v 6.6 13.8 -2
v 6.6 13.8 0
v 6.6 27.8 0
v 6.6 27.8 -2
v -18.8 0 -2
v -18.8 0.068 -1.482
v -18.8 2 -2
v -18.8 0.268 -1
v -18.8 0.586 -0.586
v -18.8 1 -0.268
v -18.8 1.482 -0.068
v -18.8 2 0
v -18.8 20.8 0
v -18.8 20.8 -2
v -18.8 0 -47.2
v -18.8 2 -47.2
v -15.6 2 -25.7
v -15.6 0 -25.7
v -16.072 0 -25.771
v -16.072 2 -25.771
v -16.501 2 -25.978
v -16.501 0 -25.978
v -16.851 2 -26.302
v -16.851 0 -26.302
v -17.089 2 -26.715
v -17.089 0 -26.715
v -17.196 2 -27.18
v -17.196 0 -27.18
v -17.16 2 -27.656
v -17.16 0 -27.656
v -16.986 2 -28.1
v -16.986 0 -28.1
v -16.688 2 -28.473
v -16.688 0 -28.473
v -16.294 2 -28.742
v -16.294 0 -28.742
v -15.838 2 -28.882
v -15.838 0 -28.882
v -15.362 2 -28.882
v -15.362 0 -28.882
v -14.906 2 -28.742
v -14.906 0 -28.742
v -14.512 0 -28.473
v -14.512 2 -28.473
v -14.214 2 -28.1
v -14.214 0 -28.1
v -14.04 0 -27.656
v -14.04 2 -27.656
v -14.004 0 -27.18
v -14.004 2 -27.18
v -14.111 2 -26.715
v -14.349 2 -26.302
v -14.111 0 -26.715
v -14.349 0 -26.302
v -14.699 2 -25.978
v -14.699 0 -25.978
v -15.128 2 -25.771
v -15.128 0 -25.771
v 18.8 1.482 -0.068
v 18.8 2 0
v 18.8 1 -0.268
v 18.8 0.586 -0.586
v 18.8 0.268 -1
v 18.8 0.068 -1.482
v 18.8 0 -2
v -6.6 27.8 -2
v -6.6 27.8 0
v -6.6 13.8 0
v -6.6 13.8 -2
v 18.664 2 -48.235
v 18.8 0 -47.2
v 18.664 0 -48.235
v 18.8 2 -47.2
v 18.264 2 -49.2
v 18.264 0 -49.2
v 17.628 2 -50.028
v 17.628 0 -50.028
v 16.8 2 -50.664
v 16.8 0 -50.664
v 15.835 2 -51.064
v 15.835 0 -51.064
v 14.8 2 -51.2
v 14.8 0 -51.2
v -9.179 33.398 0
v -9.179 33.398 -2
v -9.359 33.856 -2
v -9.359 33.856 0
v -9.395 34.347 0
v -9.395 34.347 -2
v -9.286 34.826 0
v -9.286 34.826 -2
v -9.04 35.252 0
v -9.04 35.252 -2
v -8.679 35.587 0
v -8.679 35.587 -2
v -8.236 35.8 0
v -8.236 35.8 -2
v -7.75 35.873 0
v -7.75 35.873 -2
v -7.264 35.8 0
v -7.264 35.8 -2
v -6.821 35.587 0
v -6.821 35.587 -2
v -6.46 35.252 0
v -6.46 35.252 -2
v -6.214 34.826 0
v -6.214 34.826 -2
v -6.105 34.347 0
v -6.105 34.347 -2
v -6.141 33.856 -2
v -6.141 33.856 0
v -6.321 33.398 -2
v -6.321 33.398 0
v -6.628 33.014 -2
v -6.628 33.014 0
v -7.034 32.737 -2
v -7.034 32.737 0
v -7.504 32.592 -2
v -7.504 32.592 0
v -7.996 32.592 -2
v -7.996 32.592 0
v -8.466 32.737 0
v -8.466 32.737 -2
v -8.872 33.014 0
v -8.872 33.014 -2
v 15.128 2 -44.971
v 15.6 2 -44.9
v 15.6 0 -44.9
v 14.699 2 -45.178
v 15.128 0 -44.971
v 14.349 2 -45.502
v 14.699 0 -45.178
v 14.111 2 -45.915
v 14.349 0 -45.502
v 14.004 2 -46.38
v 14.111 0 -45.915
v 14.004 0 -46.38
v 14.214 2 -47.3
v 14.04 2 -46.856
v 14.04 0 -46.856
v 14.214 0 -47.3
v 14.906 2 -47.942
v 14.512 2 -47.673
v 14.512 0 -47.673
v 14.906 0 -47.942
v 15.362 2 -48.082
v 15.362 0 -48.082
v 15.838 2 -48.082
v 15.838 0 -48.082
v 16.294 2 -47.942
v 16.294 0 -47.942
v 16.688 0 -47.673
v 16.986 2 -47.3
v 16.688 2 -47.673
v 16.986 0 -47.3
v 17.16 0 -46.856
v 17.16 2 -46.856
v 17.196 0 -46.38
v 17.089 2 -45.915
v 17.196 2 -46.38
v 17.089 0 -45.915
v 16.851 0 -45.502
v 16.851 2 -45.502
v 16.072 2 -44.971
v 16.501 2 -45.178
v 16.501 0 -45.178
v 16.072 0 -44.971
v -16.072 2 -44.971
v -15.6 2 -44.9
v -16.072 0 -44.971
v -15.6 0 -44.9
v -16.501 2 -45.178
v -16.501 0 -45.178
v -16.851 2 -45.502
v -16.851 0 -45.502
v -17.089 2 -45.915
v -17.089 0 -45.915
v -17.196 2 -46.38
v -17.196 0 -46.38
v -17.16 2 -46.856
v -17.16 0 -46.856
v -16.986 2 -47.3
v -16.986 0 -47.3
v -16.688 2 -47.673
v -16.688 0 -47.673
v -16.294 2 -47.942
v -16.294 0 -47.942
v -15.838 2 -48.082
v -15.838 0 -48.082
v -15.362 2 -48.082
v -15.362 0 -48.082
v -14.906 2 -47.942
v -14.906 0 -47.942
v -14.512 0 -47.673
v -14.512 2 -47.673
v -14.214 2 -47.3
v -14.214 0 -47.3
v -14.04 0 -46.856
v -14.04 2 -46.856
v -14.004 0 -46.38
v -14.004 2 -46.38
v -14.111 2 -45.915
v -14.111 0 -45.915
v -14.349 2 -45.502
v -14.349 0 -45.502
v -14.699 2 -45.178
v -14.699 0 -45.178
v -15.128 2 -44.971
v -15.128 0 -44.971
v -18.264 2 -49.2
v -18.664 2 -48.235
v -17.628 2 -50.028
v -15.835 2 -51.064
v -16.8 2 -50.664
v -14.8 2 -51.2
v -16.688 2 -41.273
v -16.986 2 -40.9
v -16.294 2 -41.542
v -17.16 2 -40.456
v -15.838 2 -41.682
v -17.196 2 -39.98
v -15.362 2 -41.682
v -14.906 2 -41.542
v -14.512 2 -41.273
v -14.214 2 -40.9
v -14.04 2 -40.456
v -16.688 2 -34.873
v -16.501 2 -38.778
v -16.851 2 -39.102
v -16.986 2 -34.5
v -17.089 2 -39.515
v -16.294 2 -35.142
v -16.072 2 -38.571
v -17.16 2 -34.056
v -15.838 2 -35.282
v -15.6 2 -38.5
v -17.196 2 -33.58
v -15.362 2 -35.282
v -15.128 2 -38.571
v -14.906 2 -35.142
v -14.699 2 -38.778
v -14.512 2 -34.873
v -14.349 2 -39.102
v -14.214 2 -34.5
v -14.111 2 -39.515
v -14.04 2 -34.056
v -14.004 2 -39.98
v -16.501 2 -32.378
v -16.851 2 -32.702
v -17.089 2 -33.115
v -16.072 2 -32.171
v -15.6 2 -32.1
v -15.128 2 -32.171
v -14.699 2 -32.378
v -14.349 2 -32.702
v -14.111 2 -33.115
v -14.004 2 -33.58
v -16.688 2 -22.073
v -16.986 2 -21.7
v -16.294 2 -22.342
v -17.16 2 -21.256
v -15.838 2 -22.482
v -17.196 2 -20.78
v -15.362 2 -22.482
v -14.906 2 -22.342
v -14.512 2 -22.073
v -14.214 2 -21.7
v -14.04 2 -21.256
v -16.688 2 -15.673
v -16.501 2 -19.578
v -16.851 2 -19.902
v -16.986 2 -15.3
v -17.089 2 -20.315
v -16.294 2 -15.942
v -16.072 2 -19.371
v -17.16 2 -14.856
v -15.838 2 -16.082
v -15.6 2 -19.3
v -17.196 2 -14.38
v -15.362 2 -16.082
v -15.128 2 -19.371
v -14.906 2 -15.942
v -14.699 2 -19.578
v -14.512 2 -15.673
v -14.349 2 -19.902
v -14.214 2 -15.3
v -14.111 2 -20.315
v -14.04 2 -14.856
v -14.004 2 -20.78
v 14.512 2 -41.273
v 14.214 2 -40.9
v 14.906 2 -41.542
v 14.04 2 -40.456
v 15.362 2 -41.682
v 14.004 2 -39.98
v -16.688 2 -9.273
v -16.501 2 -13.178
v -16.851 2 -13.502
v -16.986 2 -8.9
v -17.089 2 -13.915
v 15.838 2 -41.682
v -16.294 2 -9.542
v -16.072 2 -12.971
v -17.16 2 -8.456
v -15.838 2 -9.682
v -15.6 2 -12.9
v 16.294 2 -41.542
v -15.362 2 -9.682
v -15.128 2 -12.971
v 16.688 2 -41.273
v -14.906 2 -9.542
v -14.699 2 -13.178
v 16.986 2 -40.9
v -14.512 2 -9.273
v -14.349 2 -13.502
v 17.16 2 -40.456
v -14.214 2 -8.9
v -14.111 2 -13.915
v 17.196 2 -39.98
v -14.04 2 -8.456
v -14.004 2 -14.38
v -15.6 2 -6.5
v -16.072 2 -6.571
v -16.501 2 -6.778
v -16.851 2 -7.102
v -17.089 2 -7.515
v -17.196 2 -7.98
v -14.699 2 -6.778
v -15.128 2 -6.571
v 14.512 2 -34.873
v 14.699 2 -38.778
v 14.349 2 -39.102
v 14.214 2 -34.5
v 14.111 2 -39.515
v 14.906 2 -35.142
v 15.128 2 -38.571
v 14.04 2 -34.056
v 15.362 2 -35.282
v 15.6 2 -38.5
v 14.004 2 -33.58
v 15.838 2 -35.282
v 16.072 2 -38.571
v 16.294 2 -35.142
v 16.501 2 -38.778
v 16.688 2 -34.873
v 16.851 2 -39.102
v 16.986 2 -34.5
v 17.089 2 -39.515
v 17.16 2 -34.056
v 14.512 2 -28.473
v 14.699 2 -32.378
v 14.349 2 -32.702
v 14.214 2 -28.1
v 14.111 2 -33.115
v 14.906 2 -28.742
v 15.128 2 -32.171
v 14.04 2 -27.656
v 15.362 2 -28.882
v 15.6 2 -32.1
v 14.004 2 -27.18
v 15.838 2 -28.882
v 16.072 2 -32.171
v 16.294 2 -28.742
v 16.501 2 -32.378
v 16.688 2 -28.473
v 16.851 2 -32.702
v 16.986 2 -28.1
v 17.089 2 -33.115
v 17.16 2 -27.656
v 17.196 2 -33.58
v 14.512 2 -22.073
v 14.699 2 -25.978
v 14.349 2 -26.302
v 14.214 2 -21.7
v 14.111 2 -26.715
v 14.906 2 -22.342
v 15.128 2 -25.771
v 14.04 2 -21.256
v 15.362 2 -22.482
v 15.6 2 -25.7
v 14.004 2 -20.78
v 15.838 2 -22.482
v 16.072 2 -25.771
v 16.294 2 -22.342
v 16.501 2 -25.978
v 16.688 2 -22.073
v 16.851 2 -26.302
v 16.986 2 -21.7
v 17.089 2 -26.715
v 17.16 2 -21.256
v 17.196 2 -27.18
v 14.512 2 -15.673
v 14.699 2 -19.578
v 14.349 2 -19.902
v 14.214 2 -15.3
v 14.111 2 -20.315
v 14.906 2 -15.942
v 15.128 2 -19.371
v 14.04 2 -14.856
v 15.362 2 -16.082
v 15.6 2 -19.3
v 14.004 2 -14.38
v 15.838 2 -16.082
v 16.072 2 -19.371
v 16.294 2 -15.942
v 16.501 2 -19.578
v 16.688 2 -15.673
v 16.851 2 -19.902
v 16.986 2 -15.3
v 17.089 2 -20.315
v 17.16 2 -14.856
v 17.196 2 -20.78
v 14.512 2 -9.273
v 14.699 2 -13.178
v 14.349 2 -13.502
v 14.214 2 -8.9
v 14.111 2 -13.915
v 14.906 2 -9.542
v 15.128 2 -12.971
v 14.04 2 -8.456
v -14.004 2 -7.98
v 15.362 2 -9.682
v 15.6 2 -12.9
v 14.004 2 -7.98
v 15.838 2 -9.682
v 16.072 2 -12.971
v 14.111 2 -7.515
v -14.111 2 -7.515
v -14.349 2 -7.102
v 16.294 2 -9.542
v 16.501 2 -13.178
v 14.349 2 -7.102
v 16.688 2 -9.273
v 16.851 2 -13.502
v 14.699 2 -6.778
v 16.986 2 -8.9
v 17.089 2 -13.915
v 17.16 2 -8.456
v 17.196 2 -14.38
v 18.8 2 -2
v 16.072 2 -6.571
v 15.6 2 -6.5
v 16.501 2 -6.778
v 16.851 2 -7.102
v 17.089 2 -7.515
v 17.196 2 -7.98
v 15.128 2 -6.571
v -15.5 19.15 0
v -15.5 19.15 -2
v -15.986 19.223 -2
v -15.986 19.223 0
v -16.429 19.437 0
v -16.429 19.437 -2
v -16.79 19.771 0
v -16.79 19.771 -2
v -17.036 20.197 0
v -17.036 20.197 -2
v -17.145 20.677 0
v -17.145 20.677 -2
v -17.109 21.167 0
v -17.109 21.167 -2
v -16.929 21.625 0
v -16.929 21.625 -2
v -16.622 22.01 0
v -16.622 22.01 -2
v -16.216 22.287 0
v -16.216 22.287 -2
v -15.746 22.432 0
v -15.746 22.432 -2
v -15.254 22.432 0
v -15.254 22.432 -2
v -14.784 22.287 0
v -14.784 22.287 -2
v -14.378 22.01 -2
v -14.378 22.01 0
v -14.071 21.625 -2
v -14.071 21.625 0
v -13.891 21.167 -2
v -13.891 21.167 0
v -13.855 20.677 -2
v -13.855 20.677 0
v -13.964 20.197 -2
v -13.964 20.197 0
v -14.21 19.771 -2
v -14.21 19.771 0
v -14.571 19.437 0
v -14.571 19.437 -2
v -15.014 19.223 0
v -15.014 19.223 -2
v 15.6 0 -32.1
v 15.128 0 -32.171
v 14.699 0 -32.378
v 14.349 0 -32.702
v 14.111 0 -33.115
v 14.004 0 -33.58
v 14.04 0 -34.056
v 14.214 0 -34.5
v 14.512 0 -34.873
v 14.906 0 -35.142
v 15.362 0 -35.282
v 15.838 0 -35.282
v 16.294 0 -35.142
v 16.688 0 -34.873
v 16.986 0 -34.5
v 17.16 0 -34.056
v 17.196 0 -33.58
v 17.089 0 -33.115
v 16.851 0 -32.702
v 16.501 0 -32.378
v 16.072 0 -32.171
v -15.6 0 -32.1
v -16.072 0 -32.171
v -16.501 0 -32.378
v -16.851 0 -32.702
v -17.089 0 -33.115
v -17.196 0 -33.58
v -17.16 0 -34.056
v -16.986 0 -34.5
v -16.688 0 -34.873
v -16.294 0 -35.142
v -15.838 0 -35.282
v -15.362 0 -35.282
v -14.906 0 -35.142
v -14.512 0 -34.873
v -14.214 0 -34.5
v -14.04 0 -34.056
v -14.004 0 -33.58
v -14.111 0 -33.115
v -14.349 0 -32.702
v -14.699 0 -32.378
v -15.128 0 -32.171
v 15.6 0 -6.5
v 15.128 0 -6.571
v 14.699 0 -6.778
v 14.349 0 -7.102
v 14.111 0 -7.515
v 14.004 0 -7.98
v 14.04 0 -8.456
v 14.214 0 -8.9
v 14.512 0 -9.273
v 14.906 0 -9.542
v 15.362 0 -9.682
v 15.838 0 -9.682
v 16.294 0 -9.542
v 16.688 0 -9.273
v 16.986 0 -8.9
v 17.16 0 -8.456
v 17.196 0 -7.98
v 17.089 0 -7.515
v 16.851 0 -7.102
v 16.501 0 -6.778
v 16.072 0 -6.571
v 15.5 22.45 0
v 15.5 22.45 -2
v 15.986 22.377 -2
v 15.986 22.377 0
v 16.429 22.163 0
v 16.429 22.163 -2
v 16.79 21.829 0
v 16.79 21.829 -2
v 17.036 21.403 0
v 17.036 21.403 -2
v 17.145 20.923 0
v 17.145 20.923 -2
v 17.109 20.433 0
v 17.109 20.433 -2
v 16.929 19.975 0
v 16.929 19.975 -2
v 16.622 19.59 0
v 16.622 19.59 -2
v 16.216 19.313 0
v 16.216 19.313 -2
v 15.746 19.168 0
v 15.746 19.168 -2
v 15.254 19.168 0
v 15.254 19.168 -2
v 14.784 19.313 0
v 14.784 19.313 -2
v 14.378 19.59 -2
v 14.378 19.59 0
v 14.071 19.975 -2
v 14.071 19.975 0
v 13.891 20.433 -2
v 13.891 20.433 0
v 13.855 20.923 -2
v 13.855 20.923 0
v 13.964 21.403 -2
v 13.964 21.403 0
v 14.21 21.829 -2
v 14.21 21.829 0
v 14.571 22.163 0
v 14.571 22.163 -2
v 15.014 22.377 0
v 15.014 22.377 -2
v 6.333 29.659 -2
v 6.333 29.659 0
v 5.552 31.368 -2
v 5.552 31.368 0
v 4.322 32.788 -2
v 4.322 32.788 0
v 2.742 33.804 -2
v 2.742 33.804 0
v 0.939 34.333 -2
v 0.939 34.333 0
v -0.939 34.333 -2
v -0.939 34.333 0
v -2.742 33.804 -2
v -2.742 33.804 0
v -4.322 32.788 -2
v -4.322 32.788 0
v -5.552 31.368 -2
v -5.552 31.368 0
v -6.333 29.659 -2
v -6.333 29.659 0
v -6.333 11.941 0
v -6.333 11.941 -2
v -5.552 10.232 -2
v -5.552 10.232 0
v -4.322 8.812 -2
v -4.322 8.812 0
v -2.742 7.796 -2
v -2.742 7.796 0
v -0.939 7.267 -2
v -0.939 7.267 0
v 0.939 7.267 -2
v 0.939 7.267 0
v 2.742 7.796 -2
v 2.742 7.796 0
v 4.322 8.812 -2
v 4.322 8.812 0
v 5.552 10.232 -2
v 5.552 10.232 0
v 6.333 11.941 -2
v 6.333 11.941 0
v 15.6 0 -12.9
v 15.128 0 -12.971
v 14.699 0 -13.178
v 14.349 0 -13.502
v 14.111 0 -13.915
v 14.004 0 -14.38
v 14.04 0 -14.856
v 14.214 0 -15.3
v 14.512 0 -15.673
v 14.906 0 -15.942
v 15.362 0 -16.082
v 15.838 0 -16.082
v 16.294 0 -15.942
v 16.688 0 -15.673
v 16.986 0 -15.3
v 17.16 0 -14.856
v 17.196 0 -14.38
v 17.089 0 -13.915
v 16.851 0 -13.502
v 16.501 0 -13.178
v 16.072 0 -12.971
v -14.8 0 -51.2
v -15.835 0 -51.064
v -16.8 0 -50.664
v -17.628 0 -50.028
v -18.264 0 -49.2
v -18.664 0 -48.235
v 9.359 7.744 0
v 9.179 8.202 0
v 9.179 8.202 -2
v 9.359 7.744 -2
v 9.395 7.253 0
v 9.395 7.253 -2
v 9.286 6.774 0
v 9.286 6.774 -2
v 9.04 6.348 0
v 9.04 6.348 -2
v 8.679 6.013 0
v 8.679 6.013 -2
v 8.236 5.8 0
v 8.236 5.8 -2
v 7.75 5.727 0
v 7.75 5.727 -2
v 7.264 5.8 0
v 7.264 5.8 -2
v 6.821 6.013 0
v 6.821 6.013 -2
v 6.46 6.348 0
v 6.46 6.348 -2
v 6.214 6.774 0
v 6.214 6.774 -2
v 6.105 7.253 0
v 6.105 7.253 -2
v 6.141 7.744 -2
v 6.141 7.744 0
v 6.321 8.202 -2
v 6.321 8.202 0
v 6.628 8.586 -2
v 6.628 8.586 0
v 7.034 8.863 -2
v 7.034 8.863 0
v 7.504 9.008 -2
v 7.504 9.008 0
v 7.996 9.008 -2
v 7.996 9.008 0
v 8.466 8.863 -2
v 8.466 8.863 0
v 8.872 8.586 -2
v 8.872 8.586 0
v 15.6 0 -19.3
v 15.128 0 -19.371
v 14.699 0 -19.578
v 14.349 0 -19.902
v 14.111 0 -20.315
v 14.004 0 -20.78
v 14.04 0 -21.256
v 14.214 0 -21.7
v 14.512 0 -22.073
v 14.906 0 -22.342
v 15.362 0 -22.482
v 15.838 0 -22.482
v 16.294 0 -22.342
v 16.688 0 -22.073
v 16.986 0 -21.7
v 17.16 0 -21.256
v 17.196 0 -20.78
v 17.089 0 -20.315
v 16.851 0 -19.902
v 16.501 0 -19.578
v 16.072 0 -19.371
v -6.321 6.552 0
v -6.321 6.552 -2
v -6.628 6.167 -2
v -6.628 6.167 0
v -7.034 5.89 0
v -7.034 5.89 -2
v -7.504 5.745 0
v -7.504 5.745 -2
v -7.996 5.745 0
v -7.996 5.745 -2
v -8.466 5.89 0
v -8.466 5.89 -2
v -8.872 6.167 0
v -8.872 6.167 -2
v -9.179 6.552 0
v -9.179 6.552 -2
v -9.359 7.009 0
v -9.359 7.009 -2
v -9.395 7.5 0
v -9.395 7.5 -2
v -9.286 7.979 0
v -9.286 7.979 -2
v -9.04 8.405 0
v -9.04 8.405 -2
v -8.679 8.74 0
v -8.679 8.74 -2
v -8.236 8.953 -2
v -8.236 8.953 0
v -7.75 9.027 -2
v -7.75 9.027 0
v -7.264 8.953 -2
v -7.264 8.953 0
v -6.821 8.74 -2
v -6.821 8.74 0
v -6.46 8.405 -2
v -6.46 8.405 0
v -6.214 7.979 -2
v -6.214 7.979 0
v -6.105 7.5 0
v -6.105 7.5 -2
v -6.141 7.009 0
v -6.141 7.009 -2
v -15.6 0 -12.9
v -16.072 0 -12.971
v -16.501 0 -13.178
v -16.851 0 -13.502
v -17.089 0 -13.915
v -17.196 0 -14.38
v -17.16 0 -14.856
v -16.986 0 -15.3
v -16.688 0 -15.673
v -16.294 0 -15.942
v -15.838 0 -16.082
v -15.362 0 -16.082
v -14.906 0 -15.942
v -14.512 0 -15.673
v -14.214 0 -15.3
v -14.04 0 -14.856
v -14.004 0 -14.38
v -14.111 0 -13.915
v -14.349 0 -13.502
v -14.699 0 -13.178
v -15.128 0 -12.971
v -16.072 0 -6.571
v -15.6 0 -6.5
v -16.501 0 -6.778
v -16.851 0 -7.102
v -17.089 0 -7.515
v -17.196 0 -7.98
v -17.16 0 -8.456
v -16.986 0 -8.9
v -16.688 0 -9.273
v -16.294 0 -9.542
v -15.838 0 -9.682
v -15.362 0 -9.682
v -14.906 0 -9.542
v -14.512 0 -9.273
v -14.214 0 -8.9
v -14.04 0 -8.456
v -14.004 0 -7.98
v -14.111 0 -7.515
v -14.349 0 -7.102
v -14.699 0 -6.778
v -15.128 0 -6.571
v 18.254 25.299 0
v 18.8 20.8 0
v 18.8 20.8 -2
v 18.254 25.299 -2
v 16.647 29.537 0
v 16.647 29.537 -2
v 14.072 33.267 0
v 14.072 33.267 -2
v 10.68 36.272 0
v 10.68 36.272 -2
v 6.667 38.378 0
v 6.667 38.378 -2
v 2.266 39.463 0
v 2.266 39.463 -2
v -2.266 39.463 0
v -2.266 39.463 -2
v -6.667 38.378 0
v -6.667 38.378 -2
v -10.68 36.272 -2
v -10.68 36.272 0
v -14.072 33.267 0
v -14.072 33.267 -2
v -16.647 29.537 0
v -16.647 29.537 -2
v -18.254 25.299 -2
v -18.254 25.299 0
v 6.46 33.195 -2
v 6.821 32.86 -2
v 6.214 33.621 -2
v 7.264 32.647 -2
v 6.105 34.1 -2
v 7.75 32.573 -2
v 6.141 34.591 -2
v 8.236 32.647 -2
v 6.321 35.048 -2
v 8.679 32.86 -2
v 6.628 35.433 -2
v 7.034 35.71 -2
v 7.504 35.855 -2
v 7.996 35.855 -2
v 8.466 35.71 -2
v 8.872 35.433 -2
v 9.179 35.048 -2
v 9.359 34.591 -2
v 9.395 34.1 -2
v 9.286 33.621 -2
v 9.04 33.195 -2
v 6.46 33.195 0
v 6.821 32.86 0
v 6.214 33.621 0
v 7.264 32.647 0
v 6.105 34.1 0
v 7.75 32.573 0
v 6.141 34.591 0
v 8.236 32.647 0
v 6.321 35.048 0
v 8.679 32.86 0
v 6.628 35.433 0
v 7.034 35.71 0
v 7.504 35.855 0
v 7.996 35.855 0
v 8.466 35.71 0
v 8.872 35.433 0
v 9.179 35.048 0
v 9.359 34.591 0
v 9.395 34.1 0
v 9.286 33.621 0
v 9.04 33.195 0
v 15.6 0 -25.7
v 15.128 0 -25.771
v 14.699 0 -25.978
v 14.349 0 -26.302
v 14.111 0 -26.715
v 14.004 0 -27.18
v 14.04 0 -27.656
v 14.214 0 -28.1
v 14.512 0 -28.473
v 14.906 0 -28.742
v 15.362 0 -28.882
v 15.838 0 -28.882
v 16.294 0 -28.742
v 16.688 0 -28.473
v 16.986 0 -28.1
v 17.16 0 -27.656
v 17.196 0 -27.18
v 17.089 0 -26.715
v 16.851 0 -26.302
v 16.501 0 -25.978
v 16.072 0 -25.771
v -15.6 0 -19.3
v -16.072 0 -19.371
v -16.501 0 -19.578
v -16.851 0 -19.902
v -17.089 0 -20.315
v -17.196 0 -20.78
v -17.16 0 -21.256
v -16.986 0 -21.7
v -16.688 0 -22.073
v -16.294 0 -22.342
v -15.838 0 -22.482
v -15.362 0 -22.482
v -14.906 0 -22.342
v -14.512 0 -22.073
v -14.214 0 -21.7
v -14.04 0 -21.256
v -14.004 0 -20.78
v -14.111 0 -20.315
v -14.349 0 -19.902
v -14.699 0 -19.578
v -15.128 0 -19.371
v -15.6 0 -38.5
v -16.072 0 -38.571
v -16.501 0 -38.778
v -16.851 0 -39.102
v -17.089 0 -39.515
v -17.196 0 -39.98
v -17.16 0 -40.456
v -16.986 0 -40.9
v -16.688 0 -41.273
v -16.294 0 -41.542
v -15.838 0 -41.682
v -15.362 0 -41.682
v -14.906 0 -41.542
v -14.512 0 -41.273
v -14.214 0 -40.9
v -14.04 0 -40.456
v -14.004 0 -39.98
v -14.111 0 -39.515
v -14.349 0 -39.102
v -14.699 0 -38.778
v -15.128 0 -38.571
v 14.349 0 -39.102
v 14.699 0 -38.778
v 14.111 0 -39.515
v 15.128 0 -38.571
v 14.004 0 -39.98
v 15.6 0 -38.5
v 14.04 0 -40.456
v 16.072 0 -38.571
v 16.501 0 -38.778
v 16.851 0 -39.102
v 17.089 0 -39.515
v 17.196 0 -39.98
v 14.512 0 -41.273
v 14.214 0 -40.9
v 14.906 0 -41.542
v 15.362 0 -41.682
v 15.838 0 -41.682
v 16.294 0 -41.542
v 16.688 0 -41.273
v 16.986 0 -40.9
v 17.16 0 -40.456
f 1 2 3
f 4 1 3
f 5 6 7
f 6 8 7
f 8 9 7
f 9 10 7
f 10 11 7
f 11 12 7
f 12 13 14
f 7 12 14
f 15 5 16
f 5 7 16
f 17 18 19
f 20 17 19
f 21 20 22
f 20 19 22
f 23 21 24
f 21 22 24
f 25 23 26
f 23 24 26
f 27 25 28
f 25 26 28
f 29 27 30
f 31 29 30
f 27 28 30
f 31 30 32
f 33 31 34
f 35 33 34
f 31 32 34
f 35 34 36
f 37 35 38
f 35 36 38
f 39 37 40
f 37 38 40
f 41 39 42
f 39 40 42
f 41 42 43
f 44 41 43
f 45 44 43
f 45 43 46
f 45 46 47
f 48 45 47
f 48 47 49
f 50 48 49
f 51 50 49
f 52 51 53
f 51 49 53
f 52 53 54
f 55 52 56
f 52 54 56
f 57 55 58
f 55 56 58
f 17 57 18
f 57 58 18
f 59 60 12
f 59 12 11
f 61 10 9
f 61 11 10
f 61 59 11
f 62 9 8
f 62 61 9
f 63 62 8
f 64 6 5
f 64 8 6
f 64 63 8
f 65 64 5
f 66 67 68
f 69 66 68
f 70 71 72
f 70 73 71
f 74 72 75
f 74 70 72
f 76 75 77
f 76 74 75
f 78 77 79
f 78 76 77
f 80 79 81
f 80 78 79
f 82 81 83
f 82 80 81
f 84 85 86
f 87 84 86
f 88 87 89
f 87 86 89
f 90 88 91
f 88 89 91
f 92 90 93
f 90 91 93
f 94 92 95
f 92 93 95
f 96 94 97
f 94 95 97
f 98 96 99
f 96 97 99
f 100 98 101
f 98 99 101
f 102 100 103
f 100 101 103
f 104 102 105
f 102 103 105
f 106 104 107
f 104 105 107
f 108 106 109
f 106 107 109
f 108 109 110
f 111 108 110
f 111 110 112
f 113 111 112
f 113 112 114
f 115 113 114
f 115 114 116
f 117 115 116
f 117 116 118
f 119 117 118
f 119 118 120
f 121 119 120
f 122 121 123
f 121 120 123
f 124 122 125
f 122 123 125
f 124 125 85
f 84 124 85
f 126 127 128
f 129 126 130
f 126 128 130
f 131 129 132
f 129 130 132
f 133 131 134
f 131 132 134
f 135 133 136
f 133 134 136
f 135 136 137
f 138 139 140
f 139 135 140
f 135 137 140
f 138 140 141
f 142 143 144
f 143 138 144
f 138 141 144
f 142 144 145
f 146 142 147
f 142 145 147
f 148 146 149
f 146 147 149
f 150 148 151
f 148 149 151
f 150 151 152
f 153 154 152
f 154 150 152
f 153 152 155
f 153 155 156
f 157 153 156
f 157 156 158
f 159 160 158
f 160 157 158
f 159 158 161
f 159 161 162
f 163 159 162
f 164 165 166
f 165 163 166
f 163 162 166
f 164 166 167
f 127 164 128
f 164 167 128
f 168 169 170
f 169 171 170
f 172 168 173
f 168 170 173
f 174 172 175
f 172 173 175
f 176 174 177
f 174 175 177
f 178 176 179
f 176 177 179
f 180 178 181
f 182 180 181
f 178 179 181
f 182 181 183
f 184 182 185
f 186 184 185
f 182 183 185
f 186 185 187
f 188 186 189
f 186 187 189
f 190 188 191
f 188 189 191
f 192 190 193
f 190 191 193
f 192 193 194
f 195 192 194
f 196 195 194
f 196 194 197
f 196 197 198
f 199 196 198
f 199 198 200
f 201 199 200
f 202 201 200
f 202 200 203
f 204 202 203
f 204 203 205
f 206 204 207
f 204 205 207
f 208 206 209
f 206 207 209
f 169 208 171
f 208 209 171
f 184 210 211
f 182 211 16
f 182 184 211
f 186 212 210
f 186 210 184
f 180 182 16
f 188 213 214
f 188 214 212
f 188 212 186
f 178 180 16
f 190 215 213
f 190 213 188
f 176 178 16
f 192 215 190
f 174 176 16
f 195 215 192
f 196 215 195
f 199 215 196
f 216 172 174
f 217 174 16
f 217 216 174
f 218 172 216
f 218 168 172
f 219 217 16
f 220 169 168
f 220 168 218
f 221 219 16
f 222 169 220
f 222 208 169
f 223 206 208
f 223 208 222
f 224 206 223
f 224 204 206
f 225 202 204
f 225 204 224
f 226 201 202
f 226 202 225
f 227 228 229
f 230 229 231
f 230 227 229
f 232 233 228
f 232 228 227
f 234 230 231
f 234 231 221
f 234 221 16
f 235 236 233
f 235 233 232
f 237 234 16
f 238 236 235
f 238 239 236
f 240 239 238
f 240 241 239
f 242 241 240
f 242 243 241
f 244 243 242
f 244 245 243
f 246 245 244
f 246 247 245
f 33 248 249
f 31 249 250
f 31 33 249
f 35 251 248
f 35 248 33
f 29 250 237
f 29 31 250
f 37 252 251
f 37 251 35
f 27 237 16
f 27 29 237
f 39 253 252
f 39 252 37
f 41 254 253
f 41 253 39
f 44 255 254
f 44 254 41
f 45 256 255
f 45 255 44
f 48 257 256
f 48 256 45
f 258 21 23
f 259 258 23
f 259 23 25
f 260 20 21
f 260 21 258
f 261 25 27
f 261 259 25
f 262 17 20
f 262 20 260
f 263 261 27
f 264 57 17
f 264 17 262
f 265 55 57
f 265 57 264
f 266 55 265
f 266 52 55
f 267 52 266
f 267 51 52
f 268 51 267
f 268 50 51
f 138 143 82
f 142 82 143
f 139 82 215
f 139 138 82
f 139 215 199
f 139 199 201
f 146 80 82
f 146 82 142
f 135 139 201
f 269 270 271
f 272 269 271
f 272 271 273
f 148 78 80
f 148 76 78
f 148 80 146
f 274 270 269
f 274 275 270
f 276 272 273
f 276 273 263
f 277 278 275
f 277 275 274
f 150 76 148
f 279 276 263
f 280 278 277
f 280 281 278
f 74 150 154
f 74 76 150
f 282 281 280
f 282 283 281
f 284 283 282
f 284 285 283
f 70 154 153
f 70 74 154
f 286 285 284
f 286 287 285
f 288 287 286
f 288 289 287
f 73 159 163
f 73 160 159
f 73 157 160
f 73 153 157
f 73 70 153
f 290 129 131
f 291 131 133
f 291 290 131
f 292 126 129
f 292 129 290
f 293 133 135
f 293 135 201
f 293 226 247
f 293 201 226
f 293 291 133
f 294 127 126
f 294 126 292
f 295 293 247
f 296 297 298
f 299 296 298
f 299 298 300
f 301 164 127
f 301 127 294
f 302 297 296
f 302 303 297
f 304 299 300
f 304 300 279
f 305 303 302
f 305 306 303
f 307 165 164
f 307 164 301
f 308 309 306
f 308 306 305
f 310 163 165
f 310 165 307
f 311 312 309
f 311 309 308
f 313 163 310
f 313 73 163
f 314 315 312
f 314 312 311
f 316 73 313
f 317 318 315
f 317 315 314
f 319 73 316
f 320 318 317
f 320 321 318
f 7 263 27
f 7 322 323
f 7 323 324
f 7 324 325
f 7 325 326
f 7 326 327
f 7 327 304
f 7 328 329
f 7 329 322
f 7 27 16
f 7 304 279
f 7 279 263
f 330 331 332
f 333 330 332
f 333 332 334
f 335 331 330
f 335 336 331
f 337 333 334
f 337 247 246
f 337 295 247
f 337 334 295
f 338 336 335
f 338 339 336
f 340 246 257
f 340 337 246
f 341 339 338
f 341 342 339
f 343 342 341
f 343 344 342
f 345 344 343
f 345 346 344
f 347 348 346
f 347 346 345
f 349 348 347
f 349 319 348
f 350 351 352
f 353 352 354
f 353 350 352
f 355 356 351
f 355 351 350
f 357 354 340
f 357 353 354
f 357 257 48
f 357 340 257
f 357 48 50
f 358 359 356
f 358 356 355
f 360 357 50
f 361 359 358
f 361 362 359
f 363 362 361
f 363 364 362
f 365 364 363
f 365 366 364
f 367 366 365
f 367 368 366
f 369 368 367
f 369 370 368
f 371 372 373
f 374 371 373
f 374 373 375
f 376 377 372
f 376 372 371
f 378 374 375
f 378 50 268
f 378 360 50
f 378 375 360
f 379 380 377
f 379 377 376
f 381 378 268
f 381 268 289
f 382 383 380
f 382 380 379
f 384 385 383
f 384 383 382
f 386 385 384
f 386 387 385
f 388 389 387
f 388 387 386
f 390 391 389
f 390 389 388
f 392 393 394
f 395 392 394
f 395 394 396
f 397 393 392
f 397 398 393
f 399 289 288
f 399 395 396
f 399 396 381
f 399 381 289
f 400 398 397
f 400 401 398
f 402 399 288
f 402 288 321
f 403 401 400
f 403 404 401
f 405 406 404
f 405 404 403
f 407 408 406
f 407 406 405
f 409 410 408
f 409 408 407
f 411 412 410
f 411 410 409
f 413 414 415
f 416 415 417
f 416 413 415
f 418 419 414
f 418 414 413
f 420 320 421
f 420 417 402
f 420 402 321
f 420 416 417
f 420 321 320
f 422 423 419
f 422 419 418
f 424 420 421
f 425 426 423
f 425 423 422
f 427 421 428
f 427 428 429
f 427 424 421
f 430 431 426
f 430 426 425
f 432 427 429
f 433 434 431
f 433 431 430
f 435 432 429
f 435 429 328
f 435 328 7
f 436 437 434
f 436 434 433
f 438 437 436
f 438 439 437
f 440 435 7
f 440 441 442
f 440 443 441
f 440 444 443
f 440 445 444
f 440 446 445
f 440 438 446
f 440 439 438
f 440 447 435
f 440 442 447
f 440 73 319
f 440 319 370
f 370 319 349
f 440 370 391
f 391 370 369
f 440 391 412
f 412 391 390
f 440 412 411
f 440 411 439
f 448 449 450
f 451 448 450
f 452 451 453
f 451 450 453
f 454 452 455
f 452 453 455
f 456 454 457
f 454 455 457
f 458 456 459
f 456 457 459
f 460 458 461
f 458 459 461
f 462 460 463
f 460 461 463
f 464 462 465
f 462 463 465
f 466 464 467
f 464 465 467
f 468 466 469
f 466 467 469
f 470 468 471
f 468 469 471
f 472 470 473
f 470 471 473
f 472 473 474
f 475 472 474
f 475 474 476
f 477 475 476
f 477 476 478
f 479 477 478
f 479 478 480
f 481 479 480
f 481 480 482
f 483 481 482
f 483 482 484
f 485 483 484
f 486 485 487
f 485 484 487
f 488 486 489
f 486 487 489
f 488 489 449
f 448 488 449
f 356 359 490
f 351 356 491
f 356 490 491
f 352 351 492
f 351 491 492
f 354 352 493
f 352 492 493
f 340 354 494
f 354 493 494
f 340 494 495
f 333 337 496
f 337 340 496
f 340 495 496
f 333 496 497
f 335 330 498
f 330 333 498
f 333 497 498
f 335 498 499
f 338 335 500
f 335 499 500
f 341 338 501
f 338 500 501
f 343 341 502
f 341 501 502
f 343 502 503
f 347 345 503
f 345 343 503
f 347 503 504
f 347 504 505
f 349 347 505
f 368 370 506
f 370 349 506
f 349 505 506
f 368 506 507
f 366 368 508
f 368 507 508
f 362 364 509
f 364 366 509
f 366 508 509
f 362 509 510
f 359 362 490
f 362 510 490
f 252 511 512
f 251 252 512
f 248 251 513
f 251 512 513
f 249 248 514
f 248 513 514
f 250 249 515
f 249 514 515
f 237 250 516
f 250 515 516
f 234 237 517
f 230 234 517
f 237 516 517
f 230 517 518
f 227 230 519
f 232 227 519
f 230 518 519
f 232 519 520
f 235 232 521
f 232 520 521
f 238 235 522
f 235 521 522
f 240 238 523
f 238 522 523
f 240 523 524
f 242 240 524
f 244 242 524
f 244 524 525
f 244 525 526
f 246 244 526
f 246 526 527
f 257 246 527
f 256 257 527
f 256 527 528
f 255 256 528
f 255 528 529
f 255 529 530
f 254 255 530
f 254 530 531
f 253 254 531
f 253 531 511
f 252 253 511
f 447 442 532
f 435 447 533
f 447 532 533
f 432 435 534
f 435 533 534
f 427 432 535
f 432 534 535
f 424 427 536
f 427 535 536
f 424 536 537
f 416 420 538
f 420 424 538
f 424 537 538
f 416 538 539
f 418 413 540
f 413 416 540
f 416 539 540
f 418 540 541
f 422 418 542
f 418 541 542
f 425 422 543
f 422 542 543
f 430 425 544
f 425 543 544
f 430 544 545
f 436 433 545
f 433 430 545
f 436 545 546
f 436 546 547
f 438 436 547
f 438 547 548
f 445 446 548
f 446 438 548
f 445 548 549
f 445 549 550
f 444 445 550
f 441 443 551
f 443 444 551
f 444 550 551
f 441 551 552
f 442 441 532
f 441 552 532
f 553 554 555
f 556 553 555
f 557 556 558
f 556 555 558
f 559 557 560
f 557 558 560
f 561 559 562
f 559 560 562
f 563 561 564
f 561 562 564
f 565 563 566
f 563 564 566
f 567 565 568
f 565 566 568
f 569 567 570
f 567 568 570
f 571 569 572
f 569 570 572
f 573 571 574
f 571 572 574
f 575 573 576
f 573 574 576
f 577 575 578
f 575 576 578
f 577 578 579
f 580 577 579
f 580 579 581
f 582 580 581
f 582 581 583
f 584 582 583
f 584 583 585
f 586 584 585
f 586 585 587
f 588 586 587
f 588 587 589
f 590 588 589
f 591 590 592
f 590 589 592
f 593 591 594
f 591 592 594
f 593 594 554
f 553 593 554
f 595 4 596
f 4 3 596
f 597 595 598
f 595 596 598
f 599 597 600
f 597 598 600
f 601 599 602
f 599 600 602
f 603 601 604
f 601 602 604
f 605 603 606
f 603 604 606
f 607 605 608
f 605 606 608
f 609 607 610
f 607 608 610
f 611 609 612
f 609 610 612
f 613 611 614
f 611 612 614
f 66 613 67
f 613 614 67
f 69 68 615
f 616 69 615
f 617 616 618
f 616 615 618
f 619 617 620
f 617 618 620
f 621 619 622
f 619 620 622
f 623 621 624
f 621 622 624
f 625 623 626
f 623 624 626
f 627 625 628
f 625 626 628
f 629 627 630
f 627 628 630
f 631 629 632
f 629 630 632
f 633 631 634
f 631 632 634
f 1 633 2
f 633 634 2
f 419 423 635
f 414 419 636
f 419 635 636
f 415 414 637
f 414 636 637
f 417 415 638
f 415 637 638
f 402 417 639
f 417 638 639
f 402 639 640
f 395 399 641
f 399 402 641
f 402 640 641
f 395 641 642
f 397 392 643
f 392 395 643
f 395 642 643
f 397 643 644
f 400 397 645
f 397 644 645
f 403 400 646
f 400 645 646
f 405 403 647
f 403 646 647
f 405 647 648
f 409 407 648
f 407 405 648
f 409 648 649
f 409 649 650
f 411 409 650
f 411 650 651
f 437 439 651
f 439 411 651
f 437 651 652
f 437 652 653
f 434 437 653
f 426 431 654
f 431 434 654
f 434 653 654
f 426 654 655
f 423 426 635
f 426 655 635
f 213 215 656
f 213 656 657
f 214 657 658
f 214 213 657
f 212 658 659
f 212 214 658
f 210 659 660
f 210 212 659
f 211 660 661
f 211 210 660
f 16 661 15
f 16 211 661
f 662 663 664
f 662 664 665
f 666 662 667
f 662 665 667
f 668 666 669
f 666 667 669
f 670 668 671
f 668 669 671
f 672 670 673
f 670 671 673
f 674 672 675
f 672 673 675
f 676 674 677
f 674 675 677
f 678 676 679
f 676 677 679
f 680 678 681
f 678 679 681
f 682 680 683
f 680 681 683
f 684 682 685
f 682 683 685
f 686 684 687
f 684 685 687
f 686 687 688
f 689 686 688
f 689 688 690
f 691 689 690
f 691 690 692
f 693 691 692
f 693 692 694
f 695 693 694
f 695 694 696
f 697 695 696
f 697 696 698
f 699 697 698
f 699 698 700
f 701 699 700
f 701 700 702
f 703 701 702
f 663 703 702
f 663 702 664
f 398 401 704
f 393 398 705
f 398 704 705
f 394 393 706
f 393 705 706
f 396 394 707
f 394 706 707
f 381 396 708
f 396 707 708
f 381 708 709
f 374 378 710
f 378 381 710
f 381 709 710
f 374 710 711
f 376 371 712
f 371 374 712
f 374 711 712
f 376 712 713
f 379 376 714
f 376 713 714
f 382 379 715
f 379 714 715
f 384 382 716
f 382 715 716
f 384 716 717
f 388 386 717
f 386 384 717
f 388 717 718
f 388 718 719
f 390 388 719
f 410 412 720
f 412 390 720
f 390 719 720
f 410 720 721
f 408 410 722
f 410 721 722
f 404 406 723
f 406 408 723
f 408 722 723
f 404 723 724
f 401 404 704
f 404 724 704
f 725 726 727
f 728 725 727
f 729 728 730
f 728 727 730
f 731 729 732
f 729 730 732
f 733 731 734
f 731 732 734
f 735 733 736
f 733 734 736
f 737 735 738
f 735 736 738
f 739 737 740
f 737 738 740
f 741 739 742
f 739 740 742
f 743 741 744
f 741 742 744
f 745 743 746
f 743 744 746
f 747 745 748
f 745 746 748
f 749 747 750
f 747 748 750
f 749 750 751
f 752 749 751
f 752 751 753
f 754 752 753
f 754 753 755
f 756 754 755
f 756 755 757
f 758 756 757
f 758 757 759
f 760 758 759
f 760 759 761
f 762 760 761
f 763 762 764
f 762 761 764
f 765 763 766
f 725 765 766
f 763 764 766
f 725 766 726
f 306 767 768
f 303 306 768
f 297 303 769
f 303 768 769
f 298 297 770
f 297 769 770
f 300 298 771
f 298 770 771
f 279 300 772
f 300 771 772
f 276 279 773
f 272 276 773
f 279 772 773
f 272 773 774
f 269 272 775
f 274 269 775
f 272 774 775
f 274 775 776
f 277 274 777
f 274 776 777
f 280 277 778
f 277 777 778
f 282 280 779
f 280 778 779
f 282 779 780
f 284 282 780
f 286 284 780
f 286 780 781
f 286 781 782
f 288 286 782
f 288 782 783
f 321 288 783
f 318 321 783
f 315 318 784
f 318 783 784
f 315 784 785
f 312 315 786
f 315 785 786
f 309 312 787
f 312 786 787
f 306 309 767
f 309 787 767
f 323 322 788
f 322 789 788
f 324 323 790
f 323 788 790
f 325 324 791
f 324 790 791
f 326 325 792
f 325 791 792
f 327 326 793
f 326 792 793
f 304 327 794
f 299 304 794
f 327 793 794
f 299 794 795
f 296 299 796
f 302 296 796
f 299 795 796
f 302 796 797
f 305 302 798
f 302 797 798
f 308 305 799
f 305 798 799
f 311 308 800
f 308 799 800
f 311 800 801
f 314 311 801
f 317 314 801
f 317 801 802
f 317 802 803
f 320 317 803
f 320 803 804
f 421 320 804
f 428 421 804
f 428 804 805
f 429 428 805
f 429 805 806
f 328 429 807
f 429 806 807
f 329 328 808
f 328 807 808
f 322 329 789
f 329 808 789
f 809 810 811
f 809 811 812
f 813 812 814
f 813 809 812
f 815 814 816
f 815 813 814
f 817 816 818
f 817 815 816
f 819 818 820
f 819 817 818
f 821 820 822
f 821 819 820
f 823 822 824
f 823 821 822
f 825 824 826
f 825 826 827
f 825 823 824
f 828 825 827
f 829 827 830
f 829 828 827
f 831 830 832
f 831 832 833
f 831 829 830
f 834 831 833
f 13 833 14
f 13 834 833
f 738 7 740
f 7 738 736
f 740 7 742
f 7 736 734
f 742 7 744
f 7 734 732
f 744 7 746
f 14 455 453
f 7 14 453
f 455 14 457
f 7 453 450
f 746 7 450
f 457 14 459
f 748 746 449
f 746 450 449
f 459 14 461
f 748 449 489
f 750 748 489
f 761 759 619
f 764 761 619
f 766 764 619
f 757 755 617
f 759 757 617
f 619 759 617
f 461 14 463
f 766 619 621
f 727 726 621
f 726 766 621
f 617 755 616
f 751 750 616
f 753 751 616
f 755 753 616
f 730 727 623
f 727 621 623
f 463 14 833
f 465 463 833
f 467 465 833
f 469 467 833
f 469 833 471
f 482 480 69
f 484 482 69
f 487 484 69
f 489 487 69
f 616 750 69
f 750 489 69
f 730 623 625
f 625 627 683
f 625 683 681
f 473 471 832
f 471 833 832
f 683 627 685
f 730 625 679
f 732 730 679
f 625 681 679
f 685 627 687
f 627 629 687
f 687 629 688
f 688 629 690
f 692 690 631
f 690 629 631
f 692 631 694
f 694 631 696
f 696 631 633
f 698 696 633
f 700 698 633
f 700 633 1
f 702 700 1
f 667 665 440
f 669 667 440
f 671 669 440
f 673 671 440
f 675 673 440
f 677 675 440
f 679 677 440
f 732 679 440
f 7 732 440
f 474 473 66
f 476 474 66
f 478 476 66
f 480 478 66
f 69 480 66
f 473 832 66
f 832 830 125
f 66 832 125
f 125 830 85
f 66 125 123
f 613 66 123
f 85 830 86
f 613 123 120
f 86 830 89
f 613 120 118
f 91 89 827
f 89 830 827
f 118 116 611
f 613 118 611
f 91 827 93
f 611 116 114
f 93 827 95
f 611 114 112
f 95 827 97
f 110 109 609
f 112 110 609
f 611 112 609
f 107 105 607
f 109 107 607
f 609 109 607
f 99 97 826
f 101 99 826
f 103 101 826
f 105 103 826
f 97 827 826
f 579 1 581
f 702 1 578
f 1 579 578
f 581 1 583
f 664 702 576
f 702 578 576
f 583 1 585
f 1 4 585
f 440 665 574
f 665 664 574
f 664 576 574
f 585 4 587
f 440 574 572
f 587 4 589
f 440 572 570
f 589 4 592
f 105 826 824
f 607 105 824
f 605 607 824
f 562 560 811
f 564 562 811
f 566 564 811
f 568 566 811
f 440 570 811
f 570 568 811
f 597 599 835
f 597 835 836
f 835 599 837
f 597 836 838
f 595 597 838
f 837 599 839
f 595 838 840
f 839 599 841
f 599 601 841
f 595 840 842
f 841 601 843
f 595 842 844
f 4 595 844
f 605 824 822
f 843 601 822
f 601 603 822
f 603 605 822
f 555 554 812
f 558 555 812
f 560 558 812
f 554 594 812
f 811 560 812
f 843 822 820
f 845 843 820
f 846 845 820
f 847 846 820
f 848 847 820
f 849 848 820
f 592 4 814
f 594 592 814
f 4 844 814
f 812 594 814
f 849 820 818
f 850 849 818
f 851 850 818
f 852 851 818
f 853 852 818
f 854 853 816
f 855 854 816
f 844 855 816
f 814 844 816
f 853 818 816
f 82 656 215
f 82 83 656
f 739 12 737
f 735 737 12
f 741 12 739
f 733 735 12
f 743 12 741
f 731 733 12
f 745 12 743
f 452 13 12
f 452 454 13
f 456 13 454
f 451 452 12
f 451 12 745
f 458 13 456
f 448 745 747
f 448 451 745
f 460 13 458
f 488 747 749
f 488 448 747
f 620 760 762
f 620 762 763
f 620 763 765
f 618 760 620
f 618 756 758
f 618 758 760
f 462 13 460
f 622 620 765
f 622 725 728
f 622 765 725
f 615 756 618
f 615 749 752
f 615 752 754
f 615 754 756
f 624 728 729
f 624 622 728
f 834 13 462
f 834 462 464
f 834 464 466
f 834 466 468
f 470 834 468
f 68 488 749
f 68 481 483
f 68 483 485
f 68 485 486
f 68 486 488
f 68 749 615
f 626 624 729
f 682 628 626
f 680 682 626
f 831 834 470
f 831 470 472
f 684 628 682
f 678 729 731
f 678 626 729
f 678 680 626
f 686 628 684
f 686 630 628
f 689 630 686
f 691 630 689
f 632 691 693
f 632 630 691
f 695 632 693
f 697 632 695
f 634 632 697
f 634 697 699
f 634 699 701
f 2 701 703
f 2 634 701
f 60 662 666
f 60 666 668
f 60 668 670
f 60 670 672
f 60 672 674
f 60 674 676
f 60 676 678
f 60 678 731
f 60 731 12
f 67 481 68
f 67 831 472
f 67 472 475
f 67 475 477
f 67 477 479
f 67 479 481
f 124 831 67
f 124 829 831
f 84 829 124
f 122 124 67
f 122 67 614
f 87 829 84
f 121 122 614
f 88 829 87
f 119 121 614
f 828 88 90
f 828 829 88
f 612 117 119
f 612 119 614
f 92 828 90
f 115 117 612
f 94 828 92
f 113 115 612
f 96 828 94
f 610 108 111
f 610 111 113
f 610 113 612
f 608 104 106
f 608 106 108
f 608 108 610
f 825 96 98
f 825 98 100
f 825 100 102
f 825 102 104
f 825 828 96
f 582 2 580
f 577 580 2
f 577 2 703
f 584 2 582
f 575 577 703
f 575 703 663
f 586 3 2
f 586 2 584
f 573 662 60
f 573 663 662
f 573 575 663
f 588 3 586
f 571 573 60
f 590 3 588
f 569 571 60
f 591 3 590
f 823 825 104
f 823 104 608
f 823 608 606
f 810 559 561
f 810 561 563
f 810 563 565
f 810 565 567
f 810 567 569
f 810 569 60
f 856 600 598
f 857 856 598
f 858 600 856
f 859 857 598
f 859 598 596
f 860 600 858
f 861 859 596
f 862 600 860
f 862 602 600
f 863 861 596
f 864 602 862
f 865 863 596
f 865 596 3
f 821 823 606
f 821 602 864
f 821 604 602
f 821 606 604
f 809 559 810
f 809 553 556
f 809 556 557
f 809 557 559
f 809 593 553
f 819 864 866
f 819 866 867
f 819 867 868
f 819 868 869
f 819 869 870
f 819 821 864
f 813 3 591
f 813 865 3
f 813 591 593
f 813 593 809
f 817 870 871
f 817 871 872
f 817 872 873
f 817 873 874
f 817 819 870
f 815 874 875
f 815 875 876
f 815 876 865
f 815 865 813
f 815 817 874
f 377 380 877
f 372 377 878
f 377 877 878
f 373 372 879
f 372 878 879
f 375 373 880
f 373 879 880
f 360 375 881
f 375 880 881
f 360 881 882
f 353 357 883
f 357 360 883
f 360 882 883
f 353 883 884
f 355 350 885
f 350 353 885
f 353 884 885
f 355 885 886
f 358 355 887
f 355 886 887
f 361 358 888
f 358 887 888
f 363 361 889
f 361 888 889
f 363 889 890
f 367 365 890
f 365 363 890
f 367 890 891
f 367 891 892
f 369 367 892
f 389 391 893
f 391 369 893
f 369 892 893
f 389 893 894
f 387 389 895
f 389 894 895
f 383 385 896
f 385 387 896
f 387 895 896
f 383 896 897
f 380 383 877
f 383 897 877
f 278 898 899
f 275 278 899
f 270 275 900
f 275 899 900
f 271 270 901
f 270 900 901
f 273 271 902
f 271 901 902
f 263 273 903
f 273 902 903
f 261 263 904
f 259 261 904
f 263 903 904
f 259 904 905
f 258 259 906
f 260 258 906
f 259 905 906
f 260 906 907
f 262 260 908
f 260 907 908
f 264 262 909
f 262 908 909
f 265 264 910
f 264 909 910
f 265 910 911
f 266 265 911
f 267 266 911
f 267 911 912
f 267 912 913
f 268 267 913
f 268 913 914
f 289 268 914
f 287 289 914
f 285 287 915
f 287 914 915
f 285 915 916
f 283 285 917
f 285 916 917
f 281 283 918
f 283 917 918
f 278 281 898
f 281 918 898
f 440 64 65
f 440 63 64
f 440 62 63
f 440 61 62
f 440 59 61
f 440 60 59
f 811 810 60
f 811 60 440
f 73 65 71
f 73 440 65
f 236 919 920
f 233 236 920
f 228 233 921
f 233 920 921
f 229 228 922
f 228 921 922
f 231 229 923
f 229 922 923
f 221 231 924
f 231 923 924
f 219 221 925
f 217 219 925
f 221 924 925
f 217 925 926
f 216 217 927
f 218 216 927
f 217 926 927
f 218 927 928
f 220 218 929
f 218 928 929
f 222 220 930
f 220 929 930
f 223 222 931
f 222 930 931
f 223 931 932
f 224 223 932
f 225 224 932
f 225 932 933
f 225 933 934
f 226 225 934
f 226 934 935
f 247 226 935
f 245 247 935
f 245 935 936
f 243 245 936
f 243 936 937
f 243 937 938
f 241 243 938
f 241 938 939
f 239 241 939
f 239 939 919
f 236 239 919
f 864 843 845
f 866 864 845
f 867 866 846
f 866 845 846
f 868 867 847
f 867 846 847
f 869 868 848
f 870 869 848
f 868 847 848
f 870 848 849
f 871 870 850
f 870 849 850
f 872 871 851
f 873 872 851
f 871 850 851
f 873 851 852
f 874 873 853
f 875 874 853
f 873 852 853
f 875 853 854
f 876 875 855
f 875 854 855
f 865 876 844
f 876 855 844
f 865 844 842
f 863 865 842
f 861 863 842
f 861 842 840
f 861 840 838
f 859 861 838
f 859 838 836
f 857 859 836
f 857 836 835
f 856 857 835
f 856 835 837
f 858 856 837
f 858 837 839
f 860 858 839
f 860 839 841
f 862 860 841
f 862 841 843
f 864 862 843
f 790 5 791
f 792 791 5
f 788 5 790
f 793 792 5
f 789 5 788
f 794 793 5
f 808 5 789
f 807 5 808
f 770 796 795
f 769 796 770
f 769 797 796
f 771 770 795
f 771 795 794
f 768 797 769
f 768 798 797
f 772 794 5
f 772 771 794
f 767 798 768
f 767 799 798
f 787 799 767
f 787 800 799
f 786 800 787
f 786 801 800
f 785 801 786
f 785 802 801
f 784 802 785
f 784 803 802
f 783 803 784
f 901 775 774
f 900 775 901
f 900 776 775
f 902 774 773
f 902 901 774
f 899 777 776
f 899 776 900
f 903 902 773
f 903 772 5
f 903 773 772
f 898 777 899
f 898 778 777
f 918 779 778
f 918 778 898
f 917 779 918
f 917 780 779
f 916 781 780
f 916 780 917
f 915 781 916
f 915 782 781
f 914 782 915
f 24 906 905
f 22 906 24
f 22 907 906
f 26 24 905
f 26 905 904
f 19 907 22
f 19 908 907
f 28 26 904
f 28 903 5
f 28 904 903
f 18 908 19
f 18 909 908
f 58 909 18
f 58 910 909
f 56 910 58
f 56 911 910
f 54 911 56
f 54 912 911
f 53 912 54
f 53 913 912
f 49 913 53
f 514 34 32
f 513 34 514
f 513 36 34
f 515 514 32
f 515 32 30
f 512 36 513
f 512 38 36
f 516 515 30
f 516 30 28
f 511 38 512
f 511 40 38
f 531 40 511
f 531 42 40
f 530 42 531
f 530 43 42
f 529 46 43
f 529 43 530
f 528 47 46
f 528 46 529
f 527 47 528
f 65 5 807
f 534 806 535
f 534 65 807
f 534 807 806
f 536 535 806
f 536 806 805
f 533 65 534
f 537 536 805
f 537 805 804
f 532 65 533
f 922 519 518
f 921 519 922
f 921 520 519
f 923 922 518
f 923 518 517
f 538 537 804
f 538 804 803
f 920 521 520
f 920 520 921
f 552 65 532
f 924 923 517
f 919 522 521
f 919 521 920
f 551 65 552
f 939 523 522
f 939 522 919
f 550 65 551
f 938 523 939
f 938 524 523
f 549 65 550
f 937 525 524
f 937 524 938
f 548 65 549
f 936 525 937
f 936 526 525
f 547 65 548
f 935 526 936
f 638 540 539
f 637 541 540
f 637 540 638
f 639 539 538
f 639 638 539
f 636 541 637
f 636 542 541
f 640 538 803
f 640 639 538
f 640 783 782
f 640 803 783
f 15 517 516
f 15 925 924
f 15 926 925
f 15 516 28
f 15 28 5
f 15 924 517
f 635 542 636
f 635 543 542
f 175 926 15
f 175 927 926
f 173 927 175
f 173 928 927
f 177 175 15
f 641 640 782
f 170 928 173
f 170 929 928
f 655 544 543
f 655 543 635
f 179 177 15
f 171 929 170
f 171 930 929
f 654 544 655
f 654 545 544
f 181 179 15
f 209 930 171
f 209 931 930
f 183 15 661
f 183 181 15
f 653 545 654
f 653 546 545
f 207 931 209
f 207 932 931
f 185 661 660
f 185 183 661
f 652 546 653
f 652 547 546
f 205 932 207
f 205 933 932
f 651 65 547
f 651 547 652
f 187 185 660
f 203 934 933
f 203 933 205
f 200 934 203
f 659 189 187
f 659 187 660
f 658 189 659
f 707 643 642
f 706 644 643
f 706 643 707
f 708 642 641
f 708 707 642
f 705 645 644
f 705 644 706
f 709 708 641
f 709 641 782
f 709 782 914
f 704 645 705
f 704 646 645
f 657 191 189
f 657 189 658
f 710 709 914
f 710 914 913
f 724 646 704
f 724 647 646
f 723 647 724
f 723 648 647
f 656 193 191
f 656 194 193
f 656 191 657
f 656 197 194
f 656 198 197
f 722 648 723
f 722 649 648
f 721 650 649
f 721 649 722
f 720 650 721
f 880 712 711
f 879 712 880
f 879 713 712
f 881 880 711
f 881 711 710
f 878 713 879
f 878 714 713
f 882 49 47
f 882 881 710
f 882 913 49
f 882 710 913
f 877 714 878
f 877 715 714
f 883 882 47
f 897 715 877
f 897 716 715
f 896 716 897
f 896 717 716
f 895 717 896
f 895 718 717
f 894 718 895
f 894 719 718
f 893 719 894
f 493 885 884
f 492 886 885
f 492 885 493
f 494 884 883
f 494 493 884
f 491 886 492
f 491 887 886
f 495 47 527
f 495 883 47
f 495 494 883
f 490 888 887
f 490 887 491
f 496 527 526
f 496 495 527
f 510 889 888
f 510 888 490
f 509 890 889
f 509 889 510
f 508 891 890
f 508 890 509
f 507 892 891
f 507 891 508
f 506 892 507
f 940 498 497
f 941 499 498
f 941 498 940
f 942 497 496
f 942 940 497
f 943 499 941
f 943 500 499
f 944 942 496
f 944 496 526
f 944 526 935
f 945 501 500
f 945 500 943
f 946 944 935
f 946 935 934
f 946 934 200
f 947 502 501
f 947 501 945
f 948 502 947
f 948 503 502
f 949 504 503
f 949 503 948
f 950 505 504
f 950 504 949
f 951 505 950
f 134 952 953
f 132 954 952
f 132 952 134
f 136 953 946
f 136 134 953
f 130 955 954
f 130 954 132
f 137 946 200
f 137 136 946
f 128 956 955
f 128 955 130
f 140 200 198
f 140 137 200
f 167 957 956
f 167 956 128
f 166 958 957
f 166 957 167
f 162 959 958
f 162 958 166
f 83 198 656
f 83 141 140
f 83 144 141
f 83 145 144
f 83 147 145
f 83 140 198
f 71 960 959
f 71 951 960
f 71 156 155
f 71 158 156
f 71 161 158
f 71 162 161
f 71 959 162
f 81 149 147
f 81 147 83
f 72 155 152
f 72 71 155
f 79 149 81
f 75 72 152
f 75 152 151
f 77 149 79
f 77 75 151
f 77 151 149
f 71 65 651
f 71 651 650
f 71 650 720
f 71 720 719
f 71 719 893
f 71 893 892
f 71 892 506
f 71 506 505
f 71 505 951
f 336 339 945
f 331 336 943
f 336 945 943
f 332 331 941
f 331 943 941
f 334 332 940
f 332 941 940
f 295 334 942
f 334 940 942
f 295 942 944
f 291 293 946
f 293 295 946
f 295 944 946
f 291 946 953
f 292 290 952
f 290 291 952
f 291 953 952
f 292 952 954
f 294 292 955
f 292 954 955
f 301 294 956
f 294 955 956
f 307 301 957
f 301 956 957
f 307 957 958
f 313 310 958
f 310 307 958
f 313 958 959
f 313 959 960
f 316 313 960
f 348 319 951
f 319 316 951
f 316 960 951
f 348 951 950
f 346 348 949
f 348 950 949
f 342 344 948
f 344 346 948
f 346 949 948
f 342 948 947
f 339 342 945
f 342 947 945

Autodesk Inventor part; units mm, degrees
ref_plane "YZ Plane" through (0, 0, 0) normal (1, 0, 0) x (0, 1, 0)
ref_plane "XZ Plane" through (0, 0, 0) normal (0, 1, 0) x (-1, 0, 0)
ref_plane "XY Plane" through (0, 0, 0) normal (0, 0, 1) x (1, 0, 0)
sketch "Szkic5" plane through (0, 0, 0) normal (0, 0, 1) x (1, 0, 0)
  line L0 (-18.8, 0) -> (18.8, 0)
  line L1 (0, 0) -> (0, 20.8) construction
  arc A0 (18.8, 20.8) -> (-18.8, 20.8) centre (0, 20.8) ccw
  line L2 (-18.8, 0) -> (-18.8, 20.8)
  line L3 (18.8, 0) -> (18.8, 20.8)
  circle A1 centre (0, 20.8) radius 15.5 construction
  line L4 (0, 27.8) -> (0, 13.8) construction
  line L5 (0, 27.8) -> (0, 13.8) construction
  line L6 (-6.6, 27.8) -> (-6.6, 13.8)
  line L7 (6.6, 13.8) -> (6.6, 27.8)
  arc A2 (6.6, 27.8) -> (-6.6, 27.8) centre (0, 27.8) ccw
  arc A3 (-6.6, 13.8) -> (6.6, 13.8) centre (0, 13.8) ccw
  point P0 (-15.5, 20.8)
  point P1 (0, 20.8)
  dimension "d35" = 31
  dimension "d26" = 37.6
  dimension "d27" = 20.8
  dimension "d28" = 37.6
  dimension "d46" = 14
  dimension "d47" = 13.2
extrude "Wyciągnięcie proste4" add sketch "Szkic5" against normal blind 2 contours L2 A0 L3 L0 | A2 L7 A3 L6
sketch "Szkic6" plane through (18.8, 0, 0) normal (1, 0, 0) x (0, 0, -1)
  line L0 (2, 0) -> (2, 20.8) projected
  line L1 (2, 0) -> (51.2, 0)
  line L2 (51.2, 0) -> (51.2, 2)
  line L3 (51.2, 2) -> (2, 2)
  line L4 (2, 2) -> (2, 0)
  point P0 (0, 0)
  dimension "d31" = 49.2
  dimension "d32" = 2
extrude "Wyciągnięcie proste5" add sketch "Szkic6" against normal up to surface (37.6 mm away)
hole "Otwór2" at (-15.5, 20.8, 0) direction (0, 0, -1) diameter 3.3 end through all
pattern_circular "Szyk kołowy2" count 6 over 360 about axis through (0, 20.8, 0) along (0, 0, -1) of "Otwór2"
extrude "Wyciągnięcie proste6" cut sketch "Szkic5" against normal through all contours A2 L7 A3 L6
sketch "Szkic7" plane through (18.8, 2, -2) normal (0, 1, 0) x (1, 0, 0)
  line L0 (-18.8, -2) -> (-18.8, 44.5) construction
  line L1 (-34.4, 44.5) -> (-3.2, 44.5) construction
  dimension "d50" = 31.2
  dimension "d51" = 46.5
hole "Otwór3" at (-15.6, 2, -46.5) direction (0, -1, 0) diameter 3.2 end through all
pattern_linear "Szyk prostokątny1" count 7 spacing 6.4 along (0, 0, 1) of "Otwór3"
mirror "Odbij1" about plane through (0, 0, 0) normal (1, 0, 0) of "Otwór3", "Szyk prostokątny1"
fillet "Zaokrąglenie1" radius 4 2 edges at (18.8, 1, -51.2) (-18.8, 1, -51.2)
fillet "Zaokrąglenie2" radius 2 1 edges at (0, 0, 0)
properties part number "bepf_podwozie_lacznik_silnika" material "Aluminium 6061"
